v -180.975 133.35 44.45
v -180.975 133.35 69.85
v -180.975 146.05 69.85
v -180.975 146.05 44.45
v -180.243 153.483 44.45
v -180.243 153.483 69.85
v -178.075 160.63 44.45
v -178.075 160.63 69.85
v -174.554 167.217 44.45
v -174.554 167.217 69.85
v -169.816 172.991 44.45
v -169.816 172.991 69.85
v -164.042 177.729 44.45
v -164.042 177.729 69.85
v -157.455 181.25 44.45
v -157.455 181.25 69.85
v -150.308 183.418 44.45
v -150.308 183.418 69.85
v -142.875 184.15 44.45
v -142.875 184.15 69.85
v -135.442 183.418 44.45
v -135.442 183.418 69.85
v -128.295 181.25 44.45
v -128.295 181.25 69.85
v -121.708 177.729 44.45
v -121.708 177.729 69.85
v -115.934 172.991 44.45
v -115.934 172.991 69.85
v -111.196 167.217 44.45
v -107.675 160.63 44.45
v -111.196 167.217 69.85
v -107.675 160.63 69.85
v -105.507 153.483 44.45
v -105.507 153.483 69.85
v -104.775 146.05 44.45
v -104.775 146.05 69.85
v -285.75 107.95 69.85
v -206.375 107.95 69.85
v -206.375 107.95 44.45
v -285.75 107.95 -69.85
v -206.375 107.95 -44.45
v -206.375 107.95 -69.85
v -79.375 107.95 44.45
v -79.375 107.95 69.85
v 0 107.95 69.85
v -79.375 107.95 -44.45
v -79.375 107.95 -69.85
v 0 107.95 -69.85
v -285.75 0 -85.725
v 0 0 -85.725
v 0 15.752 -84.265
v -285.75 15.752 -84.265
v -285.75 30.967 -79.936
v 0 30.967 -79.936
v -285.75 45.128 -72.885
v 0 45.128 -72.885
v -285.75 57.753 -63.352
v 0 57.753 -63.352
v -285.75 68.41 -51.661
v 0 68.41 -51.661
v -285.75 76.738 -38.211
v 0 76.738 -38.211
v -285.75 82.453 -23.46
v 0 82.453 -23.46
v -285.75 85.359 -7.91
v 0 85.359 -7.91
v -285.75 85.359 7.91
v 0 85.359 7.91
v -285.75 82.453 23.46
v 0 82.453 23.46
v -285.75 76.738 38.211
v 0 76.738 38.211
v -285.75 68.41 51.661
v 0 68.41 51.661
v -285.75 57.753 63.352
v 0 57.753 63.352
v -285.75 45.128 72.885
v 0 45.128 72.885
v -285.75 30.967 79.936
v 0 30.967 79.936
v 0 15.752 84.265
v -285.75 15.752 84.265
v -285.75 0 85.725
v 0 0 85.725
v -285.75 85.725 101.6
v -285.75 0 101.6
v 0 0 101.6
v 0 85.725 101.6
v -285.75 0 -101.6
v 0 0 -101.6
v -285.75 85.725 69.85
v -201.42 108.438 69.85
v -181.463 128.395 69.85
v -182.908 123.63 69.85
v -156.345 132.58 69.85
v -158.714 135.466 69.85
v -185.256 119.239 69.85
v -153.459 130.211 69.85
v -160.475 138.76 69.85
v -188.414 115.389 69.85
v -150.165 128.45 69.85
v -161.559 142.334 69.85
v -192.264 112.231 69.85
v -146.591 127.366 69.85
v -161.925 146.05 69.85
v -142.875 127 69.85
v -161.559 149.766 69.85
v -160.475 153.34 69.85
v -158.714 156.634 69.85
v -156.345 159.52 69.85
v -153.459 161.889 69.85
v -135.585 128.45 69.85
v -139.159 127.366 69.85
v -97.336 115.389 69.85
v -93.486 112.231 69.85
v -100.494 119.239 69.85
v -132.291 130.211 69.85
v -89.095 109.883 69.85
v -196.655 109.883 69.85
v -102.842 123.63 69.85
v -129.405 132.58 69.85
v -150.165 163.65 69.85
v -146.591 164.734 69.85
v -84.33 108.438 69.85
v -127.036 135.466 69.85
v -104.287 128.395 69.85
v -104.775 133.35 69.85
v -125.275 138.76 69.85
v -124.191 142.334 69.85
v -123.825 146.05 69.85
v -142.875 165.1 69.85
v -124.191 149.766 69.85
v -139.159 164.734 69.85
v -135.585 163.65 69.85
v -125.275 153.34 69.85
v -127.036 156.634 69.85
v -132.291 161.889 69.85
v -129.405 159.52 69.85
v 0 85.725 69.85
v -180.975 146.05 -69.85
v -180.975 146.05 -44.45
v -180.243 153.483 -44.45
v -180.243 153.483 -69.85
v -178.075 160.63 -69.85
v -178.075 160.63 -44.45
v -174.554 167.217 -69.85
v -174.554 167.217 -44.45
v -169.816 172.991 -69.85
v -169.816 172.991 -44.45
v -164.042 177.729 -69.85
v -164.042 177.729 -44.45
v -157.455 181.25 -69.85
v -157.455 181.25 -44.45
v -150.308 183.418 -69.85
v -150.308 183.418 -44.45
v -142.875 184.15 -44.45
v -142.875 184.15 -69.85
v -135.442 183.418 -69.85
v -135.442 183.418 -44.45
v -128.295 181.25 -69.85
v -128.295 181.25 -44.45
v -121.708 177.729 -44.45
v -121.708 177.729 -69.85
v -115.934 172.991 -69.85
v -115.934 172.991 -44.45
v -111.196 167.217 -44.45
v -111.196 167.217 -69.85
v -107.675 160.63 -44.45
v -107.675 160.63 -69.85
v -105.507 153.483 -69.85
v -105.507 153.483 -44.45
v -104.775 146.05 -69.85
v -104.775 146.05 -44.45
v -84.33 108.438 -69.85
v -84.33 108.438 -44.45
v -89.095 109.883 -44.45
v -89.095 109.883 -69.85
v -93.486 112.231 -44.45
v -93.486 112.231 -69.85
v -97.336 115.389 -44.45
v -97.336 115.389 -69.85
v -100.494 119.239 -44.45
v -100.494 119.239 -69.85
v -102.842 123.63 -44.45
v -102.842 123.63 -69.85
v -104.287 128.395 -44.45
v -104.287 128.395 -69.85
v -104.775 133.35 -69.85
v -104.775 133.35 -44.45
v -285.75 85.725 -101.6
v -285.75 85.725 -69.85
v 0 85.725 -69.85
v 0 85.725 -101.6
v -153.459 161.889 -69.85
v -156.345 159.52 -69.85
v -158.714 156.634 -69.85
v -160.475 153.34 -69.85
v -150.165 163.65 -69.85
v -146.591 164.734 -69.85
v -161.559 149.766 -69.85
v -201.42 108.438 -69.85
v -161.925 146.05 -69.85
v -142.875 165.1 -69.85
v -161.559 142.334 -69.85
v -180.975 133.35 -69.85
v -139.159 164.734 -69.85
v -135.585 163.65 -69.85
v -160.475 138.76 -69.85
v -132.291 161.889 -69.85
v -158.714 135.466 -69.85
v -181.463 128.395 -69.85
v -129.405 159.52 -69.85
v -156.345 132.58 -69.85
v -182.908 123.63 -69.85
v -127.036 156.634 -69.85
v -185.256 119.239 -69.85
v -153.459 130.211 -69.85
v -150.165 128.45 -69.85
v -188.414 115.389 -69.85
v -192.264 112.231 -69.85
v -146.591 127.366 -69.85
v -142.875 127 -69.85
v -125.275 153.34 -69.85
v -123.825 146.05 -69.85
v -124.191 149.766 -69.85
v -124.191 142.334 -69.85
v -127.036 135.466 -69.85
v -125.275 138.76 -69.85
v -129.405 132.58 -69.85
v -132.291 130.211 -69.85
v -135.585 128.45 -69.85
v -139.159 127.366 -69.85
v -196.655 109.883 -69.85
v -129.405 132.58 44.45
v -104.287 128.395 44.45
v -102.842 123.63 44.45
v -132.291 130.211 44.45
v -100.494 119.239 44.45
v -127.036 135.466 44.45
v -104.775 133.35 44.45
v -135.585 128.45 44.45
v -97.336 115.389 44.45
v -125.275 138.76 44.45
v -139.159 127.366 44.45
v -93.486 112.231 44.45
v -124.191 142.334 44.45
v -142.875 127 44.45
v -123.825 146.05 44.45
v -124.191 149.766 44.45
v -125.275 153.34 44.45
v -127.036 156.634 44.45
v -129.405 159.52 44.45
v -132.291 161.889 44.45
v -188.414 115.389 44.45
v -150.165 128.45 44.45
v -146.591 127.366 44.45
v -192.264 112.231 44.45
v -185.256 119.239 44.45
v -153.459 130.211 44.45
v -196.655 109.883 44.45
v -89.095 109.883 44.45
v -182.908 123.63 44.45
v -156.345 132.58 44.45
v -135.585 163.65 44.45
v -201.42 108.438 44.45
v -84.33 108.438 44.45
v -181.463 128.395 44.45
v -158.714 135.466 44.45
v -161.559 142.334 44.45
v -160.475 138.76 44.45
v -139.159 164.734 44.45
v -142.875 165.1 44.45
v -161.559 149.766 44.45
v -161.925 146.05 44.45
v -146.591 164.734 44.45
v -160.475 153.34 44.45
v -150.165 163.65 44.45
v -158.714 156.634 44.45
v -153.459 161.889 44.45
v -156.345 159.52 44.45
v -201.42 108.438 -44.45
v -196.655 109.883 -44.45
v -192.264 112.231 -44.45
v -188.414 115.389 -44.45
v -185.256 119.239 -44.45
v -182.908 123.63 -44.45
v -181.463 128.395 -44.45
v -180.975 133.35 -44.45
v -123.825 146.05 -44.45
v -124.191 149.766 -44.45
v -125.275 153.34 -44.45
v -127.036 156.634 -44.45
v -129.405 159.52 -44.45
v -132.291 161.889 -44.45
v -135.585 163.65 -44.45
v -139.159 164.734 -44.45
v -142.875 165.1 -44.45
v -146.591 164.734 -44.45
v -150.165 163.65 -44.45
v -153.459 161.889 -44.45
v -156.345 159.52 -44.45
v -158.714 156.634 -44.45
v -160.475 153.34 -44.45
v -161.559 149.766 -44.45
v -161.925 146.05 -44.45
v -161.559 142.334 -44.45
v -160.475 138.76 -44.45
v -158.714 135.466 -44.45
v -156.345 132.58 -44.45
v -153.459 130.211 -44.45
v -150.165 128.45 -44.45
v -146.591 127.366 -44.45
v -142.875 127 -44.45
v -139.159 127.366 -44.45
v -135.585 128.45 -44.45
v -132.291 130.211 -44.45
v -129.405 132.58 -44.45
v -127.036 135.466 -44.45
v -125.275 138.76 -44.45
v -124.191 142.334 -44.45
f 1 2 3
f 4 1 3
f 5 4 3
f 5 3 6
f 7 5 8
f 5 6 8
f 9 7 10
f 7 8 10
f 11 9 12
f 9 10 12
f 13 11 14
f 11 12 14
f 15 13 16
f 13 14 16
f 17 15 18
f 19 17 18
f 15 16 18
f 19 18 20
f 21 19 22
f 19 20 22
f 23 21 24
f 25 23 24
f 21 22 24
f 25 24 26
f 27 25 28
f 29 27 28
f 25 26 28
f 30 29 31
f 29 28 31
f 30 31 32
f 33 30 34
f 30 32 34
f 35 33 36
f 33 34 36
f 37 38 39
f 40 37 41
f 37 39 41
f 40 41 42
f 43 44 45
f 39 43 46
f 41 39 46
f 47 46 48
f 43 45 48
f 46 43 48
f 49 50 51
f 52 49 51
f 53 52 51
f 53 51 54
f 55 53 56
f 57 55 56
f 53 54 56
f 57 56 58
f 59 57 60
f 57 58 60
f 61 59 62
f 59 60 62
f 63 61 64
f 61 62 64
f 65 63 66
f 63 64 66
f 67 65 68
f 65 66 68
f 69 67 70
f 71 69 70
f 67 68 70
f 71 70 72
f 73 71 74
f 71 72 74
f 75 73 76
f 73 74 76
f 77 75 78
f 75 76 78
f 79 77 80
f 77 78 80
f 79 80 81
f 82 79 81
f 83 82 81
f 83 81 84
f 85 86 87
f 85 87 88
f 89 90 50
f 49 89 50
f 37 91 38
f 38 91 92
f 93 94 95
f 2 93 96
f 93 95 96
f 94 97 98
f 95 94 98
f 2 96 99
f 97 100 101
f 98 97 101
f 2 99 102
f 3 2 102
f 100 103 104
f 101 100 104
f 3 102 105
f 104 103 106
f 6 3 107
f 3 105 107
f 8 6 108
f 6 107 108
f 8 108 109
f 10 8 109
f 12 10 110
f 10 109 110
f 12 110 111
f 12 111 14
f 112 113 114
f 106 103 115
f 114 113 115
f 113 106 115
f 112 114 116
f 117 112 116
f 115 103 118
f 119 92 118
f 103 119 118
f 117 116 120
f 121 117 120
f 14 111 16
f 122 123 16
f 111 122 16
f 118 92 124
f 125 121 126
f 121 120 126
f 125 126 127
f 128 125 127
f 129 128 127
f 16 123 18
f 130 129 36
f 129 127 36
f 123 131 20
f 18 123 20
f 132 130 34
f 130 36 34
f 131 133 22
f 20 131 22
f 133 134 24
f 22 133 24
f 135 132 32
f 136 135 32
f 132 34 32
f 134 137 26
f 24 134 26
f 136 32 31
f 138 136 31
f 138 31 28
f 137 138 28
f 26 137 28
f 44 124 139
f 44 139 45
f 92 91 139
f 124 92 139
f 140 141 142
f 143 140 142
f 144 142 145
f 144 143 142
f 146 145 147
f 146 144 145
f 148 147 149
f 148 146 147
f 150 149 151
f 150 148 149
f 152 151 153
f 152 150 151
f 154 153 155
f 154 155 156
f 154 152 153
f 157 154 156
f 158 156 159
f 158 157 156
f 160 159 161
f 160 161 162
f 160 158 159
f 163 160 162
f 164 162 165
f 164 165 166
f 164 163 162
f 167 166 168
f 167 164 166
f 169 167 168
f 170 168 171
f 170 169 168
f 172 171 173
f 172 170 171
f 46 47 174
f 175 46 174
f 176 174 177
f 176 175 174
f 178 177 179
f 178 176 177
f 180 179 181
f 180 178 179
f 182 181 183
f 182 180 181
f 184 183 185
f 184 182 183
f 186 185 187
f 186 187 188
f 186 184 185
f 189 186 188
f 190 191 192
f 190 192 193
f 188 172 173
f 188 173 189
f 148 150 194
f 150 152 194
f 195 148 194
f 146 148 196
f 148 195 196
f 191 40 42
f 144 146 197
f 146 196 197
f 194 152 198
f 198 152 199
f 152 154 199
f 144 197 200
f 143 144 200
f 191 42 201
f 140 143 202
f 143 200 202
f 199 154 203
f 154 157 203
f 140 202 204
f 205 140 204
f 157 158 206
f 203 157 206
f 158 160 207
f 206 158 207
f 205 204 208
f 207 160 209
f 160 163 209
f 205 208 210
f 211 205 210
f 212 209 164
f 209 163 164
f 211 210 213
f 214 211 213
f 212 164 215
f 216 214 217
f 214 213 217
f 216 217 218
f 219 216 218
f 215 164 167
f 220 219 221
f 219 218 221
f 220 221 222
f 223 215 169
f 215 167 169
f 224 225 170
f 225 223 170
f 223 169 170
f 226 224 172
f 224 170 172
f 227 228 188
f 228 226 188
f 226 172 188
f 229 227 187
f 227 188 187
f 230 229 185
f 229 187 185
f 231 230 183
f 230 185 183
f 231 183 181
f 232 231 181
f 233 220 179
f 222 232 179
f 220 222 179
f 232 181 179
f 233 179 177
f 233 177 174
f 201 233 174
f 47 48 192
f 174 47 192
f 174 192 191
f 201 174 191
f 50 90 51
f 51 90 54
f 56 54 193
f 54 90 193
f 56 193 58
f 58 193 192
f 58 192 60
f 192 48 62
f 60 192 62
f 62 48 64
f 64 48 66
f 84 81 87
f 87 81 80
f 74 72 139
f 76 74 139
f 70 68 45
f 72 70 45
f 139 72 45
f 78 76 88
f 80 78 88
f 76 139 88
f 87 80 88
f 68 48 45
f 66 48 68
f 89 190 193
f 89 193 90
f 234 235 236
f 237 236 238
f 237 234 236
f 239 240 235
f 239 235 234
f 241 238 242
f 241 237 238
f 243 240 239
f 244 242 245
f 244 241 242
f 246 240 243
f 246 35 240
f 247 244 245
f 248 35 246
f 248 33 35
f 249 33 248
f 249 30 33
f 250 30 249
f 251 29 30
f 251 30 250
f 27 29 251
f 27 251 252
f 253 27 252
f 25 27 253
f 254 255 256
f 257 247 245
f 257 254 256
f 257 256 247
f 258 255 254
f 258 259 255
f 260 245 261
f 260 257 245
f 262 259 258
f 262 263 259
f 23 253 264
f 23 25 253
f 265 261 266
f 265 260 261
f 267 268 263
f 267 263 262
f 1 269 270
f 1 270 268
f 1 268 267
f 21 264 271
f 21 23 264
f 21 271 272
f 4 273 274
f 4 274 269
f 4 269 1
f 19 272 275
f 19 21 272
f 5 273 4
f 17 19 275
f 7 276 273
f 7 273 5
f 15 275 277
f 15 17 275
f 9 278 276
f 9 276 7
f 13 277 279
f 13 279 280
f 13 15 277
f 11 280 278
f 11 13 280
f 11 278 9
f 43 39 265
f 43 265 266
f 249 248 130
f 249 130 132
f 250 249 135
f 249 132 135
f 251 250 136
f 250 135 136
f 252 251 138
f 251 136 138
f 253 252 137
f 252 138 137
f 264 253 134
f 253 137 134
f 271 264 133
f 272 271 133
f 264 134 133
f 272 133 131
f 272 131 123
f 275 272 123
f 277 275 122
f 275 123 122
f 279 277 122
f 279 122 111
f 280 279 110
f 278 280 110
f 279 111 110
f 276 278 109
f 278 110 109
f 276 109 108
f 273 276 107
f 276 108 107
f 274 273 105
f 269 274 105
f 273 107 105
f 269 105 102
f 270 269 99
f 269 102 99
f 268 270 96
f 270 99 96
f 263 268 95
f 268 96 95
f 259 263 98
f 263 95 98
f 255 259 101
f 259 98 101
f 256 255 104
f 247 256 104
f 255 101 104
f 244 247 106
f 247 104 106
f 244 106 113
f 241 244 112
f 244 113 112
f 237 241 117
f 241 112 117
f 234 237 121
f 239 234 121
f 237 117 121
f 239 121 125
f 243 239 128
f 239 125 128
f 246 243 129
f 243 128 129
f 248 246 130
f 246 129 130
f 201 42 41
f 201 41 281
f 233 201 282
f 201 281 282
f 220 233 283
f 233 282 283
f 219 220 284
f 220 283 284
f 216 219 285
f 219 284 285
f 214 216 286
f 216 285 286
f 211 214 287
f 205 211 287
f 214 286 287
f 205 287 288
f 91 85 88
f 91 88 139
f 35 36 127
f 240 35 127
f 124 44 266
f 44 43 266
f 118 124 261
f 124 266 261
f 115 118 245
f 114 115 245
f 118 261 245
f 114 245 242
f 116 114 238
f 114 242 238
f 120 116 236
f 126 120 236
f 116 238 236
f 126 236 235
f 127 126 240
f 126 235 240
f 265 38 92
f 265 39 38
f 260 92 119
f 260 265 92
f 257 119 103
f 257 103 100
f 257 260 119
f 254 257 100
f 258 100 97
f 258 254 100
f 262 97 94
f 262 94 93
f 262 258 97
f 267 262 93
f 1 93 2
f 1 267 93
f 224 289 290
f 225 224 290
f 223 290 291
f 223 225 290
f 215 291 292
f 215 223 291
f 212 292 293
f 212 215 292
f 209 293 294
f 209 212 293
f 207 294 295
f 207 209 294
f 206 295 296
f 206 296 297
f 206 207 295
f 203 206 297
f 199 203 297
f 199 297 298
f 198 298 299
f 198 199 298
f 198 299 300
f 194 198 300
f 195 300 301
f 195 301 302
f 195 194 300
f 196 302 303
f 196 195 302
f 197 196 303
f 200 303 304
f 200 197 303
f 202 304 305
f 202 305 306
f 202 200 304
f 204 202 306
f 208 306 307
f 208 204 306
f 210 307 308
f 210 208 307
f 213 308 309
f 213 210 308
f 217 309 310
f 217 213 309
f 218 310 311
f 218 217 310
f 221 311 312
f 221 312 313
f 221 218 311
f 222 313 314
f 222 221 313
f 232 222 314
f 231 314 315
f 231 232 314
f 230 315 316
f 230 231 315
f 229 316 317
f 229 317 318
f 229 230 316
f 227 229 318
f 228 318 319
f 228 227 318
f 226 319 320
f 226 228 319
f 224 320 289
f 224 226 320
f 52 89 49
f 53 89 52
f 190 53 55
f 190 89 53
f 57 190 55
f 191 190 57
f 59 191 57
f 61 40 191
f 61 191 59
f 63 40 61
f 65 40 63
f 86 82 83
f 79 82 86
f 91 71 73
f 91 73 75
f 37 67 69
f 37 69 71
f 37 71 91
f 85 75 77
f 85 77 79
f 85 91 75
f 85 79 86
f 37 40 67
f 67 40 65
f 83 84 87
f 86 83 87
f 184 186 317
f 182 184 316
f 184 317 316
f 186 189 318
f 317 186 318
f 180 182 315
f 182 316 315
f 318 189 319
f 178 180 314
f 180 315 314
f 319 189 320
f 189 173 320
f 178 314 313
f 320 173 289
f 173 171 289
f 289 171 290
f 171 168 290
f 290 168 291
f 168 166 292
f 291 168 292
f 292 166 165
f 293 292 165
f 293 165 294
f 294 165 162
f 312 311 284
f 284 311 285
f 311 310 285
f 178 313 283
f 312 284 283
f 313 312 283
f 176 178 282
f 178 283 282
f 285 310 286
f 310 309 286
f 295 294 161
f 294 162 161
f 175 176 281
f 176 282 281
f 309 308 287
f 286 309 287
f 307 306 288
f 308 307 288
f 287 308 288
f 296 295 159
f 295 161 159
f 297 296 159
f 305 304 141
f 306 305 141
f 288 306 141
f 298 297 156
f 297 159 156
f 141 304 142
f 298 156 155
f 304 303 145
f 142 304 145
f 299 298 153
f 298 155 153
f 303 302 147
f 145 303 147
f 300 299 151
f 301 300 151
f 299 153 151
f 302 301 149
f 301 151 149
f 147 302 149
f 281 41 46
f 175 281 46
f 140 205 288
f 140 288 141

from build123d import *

# Parameters (mm, degrees)
BASE_EXTRUDE_DEPTH   = 285.75
BOSS_EXTRUDE1_DEPTH  = 25.4
FILLET1_R            = 25.4
SKETCH3_R            = 19.05
CUT_EXTRUDE1_DEPTH   = 25.4
FILLET1_OF_MIRROR1_R = 25.4


with BuildPart() as part:
    # Sketch1 → Base-Extrude (new body)
    with BuildSketch(Plane(origin=(0, 0, 0), x_dir=(0, 0, -1), z_dir=(1, 0, 0))):
        with BuildLine():
            Line((-85.725, 0), (-101.6, 0))
            Line((-101.6, 0), (-101.6, 85.725))
            Line((-101.6, 85.725), (-69.85, 85.725))
            Line((-69.85, 85.725), (-69.85, 107.95))
            Line((-69.85, 107.95), (69.85, 107.95))
            Line((69.85, 107.95), (69.85, 85.725))
            Line((69.85, 85.725), (101.6, 85.725))
            Line((101.6, 85.725), (101.6, 0))
            Line((101.6, 0), (85.725, 0))
            ThreePointArc((85.725, 0), (0, 85.725), (-85.725, 0))
        make_face()
    extrude(amount=-BASE_EXTRUDE_DEPTH)

    # Sketch2 → Boss-Extrude1 (add)
    with BuildSketch(Plane.XY.offset(69.85)):
        with BuildLine():
            Line((-180.975, 107.95), (-180.975, 146.05))
            ThreePointArc((-180.975, 146.05), (-142.875, 184.15), (-104.775, 146.05))
            Line((-104.775, 146.05), (-104.775, 107.95))
            Line((-104.775, 107.95), (-180.975, 107.95))
        make_face()
    boss_extrude1 = extrude(amount=-BOSS_EXTRUDE1_DEPTH)

    # Fillet1
    fillet1_edges = [part.edges().sort_by_distance(p)[0] for p in [
        (-104.775, 107.95, 57.15),
        (-180.975, 107.95, 57.15),
    ]]
    fillet(fillet1_edges, radius=FILLET1_R)

    # Sketch3 → Cut-Extrude1 (cut)
    with BuildSketch(Plane.XY.offset(69.85)):
        with Locations((-142.875, 146.05)):
            Circle(SKETCH3_R)
    cut_extrude1 = extrude(amount=-CUT_EXTRUDE1_DEPTH, mode=Mode.SUBTRACT)

    # Mirror1: Boss-Extrude1, Cut-Extrude1 across plane
    add(boss_extrude1.mirror(Plane.XY))
    add(cut_extrude1.mirror(Plane.XY), mode=Mode.SUBTRACT)

    # Fillet1 of Mirror1
    fillet1_of_mirror1_edges = [part.edges().sort_by_distance(p)[0] for p in [
        (-104.775, 107.95, -57.15),
        (-180.975, 107.95, -57.15),
    ]]
    fillet(fillet1_of_mirror1_edges, radius=FILLET1_OF_MIRROR1_R)


solid = part.part
